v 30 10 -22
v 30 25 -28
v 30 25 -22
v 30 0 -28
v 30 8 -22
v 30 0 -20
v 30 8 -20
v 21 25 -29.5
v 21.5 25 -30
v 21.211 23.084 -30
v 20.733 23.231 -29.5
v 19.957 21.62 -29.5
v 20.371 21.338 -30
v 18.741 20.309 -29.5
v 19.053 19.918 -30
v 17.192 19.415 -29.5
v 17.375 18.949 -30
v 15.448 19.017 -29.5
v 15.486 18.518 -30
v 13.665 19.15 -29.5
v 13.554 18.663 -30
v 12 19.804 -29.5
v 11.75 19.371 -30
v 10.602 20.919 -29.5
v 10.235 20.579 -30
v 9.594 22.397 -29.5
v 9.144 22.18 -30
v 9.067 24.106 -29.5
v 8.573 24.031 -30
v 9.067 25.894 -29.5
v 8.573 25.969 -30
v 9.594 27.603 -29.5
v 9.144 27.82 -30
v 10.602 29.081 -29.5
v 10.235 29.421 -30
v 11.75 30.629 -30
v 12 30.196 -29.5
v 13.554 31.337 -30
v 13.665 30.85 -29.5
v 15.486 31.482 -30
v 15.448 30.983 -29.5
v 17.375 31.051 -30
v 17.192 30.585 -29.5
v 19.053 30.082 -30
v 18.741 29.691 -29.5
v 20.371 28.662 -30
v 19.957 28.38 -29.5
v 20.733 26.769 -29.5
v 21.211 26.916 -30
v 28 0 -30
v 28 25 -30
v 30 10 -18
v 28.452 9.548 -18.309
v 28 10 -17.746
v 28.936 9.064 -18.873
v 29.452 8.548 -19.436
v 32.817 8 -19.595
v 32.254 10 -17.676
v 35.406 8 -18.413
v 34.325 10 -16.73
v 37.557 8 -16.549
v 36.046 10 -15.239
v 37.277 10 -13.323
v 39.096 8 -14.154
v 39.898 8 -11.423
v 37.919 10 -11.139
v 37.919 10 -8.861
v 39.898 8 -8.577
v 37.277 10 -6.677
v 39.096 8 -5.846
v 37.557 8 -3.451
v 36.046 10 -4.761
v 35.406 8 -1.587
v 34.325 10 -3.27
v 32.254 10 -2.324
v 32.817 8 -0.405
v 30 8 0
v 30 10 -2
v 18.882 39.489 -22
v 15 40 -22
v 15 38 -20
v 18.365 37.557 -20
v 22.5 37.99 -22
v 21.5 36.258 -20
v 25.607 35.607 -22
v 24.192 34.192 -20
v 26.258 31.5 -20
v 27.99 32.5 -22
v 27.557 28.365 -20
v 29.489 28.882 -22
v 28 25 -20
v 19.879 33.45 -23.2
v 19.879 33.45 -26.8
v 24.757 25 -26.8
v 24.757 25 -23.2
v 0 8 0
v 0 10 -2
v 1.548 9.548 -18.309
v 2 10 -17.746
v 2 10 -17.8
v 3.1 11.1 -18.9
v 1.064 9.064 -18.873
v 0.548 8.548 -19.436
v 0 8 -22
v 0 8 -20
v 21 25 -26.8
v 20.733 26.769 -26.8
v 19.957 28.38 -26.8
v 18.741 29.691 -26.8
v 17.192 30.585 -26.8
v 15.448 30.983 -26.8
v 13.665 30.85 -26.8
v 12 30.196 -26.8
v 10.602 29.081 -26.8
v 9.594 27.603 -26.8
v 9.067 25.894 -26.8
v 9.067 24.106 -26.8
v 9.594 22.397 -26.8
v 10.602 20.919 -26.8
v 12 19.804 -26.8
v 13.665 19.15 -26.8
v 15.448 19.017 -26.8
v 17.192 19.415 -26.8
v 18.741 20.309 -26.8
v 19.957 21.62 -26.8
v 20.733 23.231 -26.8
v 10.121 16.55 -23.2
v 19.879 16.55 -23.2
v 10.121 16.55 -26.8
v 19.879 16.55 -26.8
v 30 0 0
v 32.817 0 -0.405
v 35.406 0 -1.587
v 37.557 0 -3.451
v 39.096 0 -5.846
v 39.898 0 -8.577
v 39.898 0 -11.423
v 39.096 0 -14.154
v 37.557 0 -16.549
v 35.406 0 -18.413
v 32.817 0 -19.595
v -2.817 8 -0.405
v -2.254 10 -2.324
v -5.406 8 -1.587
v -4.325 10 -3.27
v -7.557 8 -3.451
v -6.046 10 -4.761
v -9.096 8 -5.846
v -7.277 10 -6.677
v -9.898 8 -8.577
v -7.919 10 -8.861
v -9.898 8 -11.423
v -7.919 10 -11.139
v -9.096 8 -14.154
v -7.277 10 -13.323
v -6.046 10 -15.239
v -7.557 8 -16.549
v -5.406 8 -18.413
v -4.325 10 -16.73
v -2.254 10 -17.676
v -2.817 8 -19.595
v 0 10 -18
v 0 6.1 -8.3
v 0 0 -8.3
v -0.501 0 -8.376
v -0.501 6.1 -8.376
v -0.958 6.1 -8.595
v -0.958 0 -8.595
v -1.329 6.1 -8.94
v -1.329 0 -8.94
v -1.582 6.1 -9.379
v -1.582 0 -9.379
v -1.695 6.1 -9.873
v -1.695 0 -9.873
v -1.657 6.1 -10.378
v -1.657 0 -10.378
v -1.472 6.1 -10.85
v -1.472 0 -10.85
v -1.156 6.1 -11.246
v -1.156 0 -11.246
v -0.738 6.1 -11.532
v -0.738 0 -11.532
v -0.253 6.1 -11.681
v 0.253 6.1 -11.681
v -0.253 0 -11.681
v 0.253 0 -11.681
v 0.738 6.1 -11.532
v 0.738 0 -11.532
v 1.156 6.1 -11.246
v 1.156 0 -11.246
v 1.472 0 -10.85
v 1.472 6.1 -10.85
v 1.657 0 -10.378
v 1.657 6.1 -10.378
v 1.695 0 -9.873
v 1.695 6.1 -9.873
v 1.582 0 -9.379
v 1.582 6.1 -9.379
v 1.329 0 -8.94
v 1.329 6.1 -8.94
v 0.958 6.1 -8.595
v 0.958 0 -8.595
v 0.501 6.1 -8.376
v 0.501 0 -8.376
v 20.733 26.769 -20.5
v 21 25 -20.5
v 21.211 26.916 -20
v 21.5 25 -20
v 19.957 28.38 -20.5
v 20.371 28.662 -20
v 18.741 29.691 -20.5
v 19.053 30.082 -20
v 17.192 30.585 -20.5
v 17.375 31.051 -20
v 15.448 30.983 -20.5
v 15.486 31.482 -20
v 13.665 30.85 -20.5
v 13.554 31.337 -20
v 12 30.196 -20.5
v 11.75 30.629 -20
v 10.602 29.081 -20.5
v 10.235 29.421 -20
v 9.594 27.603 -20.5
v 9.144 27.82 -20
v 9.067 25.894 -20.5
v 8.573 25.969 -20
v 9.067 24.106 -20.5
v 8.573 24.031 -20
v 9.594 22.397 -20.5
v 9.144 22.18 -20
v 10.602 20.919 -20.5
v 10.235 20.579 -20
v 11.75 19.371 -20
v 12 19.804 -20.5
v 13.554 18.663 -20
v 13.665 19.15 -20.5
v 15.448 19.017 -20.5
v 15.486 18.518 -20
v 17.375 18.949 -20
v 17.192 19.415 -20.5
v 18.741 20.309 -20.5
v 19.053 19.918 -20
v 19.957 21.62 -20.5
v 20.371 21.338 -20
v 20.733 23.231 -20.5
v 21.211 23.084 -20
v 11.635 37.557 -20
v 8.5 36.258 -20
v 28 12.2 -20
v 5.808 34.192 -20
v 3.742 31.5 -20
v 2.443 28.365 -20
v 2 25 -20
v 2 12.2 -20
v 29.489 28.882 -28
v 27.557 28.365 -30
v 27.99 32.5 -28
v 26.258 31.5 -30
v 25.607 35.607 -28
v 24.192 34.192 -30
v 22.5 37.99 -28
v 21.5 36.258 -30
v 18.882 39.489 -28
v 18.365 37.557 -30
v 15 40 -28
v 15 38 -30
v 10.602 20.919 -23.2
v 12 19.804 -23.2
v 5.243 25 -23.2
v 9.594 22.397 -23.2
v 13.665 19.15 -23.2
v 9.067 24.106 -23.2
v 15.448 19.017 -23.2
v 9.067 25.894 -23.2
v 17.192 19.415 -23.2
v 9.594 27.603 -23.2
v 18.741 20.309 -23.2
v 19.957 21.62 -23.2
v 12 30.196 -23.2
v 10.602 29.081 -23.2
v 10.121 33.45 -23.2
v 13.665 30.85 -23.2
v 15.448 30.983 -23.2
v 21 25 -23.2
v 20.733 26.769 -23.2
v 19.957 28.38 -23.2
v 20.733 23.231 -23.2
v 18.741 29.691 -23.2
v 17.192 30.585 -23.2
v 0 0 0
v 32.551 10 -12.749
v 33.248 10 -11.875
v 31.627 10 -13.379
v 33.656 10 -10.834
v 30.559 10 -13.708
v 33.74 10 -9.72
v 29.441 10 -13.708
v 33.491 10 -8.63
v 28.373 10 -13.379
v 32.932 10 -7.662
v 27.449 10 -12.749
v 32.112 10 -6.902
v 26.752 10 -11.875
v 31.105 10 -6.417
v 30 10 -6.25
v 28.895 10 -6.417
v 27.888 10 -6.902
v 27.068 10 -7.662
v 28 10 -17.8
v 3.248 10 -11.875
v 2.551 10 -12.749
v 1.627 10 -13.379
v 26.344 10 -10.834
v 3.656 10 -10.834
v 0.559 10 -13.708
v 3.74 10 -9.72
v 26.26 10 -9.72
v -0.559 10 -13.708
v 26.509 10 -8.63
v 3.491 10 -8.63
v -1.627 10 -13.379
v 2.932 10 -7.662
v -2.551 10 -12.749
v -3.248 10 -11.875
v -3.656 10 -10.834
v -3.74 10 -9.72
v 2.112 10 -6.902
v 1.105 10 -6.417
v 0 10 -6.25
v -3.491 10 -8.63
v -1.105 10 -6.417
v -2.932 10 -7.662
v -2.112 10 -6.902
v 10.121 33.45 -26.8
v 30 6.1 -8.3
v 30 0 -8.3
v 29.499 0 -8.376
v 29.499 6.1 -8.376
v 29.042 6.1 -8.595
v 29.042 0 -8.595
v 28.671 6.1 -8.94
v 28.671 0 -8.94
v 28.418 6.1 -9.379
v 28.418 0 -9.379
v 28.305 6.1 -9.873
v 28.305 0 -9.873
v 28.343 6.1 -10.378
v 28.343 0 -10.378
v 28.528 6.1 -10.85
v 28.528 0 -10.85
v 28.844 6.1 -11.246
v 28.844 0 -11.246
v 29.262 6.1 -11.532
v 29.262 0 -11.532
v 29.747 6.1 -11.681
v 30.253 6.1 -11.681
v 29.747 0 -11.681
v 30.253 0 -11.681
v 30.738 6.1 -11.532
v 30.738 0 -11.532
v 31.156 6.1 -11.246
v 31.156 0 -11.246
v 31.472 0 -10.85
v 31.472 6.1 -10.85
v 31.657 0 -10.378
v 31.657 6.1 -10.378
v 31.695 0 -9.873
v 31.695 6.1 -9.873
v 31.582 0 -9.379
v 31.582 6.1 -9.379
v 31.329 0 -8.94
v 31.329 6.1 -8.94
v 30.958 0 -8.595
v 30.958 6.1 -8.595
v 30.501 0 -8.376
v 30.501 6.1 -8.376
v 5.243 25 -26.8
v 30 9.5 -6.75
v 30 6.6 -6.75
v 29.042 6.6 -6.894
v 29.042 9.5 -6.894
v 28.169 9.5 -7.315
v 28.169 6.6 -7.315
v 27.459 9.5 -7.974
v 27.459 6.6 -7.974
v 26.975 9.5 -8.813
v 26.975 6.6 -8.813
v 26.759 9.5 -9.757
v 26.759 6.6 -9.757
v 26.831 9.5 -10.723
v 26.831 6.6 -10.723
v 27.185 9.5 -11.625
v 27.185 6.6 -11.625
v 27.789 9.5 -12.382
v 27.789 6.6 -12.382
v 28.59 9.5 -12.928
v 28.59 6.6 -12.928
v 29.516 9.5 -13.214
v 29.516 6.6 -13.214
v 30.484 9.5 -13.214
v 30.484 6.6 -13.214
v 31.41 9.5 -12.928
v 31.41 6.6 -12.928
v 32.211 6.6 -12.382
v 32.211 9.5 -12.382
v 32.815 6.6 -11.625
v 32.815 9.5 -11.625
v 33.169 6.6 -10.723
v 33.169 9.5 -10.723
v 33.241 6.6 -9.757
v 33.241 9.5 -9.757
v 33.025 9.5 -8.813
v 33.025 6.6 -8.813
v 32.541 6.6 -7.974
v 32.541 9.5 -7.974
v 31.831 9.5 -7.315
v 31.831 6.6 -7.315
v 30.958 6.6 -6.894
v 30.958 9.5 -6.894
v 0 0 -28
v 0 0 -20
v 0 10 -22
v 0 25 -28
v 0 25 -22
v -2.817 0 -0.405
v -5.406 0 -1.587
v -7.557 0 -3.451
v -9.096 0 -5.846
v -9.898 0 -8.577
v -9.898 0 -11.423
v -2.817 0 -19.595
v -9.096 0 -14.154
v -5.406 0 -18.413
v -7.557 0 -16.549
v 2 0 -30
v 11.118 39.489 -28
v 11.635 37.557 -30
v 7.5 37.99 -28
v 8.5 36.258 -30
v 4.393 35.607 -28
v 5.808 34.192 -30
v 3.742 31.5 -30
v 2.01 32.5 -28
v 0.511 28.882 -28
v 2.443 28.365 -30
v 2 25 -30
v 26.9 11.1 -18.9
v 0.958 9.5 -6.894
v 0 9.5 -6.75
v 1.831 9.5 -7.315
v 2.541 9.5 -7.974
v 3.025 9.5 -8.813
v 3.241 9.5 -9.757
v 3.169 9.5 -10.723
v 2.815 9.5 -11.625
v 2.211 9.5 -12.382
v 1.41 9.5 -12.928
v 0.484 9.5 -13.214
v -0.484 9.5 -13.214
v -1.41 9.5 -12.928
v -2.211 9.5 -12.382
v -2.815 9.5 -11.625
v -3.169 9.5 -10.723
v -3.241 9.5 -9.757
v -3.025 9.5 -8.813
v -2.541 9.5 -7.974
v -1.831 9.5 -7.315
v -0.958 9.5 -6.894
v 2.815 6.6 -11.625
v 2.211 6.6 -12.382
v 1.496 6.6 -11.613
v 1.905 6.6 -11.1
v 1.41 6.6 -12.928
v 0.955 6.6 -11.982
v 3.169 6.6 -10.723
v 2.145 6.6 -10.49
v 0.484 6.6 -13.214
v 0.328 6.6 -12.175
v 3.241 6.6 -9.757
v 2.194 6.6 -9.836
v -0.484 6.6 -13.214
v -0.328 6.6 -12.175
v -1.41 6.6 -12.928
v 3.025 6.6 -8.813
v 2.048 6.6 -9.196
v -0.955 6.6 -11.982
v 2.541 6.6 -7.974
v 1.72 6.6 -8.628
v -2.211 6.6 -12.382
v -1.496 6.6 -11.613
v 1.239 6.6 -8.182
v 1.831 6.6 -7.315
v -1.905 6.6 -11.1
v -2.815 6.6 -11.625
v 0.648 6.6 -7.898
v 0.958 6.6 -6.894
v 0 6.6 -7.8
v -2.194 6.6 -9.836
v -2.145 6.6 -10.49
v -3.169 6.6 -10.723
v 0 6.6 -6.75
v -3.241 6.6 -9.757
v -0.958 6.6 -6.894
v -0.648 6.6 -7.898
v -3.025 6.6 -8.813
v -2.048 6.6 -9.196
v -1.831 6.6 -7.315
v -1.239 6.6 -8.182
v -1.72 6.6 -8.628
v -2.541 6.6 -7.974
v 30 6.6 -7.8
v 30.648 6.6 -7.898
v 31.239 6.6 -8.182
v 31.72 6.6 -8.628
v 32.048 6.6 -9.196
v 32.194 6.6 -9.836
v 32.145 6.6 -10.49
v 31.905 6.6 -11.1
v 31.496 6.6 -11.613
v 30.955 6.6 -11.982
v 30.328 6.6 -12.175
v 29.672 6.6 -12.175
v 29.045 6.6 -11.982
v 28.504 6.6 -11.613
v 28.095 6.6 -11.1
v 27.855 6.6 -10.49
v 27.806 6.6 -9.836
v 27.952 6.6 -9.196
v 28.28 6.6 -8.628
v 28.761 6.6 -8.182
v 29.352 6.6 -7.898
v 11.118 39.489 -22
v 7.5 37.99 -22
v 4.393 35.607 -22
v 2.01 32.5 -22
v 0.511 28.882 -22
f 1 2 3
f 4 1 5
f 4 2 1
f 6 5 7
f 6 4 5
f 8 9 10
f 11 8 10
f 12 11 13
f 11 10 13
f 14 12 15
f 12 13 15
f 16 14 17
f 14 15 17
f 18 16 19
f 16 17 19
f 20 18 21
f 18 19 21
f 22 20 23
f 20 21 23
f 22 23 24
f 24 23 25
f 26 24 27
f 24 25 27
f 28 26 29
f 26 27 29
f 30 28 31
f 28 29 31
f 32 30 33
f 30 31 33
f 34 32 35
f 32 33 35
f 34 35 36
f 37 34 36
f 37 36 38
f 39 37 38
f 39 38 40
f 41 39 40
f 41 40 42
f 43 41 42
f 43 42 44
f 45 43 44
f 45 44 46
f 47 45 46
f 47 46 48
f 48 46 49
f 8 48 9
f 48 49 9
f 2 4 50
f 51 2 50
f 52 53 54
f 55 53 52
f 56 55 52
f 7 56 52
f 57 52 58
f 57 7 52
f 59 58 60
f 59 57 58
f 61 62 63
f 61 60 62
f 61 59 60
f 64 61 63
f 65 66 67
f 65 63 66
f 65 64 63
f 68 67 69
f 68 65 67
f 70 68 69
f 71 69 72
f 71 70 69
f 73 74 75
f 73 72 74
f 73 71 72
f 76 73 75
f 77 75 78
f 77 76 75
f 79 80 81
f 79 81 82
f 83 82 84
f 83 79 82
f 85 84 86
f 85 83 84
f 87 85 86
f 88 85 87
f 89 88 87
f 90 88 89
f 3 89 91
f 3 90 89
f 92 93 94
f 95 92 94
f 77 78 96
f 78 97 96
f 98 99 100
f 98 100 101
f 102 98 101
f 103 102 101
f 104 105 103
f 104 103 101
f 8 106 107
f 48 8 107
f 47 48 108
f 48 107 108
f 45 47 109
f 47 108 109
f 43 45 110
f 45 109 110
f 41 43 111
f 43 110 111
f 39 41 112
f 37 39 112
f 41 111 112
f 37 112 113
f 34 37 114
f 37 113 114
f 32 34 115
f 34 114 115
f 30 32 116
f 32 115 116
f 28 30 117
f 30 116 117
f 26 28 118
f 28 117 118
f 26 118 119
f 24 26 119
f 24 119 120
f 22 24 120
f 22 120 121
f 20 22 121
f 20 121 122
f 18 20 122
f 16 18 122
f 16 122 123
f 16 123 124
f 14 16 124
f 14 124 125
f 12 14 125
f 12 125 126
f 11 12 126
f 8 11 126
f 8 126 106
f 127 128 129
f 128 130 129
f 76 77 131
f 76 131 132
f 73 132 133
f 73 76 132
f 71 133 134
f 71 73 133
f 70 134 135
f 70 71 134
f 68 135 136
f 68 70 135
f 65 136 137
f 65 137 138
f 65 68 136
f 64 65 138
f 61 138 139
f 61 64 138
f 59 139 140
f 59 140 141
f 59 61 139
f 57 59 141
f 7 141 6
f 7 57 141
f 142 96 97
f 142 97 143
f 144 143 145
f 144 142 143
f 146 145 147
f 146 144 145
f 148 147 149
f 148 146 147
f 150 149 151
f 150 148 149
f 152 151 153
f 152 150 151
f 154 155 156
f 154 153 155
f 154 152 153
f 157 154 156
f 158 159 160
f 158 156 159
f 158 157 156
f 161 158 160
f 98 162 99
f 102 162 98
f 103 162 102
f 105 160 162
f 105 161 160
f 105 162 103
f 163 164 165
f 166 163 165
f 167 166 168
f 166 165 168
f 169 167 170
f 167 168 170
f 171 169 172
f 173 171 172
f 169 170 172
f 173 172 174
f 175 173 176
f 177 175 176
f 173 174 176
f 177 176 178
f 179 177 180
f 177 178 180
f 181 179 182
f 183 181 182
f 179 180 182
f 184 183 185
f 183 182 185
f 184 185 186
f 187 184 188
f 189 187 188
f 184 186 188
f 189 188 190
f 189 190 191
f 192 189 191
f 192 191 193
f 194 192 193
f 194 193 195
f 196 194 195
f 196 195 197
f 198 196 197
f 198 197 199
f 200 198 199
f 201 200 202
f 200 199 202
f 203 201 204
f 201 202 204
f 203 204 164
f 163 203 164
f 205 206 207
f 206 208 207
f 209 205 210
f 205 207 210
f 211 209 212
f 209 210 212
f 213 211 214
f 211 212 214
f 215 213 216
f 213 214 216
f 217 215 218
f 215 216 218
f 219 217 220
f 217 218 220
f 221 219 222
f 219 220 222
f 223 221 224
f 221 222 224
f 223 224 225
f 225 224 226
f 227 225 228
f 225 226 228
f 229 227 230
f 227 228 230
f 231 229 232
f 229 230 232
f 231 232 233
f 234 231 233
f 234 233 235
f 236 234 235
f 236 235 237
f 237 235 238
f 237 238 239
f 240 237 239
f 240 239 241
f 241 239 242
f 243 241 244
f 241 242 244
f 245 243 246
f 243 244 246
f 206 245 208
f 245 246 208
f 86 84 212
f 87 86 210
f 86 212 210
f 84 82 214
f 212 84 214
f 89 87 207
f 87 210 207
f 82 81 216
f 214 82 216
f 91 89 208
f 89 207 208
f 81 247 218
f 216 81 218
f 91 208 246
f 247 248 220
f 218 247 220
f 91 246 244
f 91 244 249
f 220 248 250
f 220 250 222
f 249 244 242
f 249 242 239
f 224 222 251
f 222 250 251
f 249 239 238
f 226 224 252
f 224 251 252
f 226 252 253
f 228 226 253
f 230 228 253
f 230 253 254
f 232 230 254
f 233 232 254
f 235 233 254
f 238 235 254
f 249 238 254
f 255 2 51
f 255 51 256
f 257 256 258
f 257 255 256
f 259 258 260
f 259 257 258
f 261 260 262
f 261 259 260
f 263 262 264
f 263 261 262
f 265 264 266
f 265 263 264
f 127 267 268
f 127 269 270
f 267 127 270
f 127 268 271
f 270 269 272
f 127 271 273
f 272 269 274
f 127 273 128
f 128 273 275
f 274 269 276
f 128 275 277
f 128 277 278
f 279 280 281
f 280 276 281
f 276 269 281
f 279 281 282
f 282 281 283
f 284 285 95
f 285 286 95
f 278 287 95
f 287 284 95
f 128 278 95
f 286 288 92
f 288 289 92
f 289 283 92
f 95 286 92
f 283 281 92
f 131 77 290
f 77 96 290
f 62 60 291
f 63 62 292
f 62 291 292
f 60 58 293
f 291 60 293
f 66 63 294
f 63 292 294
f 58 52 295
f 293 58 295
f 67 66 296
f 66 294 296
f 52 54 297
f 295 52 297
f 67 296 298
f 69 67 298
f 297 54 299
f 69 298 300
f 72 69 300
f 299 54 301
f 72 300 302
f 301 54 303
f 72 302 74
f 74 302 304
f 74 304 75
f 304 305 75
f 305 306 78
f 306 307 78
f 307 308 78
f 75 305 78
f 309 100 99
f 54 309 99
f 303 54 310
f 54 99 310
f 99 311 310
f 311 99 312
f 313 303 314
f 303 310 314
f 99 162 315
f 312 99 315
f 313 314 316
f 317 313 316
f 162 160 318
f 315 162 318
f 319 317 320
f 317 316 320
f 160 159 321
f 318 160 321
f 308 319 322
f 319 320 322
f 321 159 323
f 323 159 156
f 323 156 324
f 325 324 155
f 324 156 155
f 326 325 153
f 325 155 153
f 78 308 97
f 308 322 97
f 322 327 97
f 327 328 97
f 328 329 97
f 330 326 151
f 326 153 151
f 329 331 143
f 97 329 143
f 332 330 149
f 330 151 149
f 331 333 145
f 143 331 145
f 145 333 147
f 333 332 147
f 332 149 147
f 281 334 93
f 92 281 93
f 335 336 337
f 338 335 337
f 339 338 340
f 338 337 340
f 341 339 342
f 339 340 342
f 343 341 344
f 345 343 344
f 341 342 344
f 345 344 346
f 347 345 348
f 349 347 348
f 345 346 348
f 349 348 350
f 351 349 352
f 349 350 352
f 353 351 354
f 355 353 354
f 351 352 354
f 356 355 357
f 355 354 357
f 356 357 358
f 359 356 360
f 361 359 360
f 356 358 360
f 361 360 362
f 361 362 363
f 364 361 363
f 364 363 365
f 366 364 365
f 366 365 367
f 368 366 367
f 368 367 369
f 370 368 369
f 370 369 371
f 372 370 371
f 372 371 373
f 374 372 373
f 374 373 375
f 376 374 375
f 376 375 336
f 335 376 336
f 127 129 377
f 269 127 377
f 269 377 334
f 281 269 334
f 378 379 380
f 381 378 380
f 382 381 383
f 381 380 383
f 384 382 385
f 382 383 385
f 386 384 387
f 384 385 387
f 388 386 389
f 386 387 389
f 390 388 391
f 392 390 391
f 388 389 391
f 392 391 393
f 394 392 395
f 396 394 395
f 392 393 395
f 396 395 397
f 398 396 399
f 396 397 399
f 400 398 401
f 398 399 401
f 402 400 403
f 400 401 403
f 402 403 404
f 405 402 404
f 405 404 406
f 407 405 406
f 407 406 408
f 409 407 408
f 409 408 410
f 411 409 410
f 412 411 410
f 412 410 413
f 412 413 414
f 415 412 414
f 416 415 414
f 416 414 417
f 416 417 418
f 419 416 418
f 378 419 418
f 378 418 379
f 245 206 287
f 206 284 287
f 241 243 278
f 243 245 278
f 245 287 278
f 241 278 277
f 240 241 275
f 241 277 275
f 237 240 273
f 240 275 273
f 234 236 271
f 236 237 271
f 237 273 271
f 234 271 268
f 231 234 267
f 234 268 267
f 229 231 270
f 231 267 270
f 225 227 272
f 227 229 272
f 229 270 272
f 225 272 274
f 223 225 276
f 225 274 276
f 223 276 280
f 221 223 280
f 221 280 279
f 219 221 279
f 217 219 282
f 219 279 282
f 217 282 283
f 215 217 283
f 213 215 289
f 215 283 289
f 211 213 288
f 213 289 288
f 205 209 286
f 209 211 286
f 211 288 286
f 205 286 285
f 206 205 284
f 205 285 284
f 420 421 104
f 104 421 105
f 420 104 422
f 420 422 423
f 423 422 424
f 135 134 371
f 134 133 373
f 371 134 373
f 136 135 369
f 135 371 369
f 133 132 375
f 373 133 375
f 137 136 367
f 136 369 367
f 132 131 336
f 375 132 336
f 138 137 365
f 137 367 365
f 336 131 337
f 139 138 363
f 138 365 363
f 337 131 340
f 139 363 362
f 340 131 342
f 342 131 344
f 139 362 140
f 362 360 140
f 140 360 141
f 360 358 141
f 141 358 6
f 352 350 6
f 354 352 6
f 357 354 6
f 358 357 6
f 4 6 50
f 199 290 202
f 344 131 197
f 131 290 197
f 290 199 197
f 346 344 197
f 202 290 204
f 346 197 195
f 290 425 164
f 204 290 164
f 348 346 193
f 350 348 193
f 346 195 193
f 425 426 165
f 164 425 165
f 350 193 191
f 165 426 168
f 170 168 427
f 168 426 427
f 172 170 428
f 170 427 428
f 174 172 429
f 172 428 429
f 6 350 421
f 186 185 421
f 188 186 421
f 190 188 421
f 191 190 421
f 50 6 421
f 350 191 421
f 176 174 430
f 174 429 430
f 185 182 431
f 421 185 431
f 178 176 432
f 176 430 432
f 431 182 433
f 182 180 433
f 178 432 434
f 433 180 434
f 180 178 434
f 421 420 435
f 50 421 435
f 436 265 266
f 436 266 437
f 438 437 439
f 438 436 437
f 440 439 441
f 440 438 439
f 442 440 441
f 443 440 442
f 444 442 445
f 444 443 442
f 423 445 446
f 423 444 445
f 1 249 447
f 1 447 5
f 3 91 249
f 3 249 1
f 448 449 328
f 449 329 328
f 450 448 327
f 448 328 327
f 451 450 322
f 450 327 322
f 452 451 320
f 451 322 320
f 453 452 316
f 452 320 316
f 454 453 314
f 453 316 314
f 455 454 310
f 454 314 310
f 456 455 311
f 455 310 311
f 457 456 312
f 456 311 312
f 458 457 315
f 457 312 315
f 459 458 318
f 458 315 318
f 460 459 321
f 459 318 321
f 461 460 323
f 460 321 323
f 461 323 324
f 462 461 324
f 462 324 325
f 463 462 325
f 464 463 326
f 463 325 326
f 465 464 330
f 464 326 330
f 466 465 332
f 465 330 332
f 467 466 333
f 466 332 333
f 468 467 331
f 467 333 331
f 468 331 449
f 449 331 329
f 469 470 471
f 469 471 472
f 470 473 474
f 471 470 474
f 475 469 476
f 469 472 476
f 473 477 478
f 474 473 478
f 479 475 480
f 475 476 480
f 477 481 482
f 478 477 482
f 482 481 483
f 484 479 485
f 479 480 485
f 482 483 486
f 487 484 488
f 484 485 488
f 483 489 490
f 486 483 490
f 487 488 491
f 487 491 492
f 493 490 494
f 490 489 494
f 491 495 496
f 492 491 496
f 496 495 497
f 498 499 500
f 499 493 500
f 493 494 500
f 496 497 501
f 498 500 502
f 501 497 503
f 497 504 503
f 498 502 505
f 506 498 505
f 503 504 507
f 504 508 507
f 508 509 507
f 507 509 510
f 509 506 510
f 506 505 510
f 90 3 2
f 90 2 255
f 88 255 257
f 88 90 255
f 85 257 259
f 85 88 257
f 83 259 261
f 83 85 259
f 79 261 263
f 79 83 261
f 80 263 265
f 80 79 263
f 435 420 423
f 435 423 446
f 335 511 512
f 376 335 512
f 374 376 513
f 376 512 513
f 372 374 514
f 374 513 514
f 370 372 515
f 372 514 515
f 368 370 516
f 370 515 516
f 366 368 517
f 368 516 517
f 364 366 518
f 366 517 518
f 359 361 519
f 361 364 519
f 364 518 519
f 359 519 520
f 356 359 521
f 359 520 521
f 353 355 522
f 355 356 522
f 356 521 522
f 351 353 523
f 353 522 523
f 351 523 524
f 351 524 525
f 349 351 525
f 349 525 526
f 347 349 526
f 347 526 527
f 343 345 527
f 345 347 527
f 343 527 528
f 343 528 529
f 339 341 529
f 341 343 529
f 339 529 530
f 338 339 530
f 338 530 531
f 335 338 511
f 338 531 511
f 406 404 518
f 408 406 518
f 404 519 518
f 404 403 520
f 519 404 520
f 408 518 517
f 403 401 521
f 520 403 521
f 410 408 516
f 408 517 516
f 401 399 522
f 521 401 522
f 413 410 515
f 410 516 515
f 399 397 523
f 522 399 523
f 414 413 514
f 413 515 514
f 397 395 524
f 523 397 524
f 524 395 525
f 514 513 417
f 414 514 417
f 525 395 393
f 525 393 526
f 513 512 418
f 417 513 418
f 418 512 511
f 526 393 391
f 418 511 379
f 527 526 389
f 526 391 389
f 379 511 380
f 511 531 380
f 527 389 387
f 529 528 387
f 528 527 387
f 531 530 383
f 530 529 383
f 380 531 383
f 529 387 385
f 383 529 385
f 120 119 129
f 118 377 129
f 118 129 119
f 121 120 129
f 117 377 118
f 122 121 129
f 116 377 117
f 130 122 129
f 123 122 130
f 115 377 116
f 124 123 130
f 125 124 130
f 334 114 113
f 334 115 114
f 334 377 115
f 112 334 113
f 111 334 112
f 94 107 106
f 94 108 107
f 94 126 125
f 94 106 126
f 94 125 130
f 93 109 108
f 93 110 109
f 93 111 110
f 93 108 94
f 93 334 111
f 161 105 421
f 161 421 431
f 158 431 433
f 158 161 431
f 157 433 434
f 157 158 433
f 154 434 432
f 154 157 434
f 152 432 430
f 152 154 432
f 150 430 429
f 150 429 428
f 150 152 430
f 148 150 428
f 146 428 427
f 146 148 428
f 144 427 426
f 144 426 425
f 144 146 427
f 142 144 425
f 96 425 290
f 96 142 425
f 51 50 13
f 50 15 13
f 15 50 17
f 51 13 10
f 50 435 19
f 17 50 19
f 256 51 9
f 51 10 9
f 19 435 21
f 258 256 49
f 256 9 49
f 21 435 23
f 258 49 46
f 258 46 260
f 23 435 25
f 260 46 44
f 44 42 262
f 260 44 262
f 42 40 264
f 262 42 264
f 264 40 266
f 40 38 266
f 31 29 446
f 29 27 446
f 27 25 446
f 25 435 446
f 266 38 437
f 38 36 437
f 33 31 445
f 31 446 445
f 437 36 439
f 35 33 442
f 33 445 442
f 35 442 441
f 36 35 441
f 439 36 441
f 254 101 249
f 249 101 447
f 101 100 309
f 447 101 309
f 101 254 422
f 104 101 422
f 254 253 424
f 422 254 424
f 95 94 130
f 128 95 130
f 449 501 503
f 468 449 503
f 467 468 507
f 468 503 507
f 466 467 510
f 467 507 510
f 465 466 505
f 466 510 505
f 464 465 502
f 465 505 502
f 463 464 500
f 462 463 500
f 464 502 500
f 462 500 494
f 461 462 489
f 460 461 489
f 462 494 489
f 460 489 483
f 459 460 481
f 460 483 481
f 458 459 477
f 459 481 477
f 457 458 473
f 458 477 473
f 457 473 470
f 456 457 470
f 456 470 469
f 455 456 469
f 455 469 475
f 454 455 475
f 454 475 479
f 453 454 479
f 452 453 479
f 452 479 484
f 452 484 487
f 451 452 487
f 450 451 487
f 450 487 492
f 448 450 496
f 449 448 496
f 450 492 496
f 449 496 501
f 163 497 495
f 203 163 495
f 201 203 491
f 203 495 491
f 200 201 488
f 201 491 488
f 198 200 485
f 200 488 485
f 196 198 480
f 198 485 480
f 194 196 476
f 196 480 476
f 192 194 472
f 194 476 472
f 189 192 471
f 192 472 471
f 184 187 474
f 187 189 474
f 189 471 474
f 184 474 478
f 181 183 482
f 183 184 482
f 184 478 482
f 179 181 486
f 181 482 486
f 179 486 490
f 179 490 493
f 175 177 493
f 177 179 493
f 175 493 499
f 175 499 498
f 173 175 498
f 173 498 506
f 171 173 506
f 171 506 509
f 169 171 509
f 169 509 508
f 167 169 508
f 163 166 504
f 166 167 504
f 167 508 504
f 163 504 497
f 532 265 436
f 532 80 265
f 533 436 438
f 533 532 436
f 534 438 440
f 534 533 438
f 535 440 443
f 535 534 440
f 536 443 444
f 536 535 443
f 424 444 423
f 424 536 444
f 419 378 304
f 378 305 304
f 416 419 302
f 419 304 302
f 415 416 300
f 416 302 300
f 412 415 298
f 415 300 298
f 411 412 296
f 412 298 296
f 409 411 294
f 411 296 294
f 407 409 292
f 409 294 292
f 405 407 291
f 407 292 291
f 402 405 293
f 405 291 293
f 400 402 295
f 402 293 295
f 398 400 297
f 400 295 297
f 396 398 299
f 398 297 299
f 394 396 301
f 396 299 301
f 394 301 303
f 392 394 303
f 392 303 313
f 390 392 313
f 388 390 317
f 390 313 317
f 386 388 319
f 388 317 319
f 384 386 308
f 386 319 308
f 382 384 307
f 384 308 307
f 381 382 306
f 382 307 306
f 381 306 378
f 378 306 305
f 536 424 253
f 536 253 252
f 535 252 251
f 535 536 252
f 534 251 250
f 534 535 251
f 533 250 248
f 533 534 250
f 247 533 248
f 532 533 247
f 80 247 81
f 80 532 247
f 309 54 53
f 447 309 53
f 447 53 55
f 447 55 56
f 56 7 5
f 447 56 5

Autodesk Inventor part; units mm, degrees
ref_plane "YZ Plane" through (0, 0, 0) normal (1, 0, 0) x (0, 1, 0)
ref_plane "XZ Plane" through (0, 0, 0) normal (0, 1, 0) x (-1, 0, 0)
sketch "Skizze1" plane through (0, 0, 0) normal (1, 0, 0) x (0, 1, 0)
  line L0 (0, 0) -> (0, -30)
  line L1 (0, -30) -> (40, -30)
  line L2 (40, -30) -> (40, -20)
  line L3 (40, -20) -> (10, -20)
  line L4 (10, -20) -> (10, 0)
  line L5 (10, 0) -> (0, 0)
  dimension "d0" = 40
  dimension "d1" = 30
  dimension "d2" = 10
  dimension "d3" = 10
extrude "Extrusion1" add sketch "Skizze1" along normal blind 30
ref_plane "Arbeitsebene1" through (0, 10, -25) normal (0, 0, 1) x (1, 0, 0)
sketch "Skizze2" plane through (0, 10, -25) normal (0, 0, 1) x (1, 0, 0)
  line L0 (0, -10) -> (0, 30) projected
  line L1 (0, 30) -> (30, 30) projected
  line L2 (30, -10) -> (30, 30) projected
  line L3 (0, 30) -> (30, 0) construction
  line L4 (30, 30) -> (0, 0) construction
  line L5 (0, 0) -> (30, 0) construction
  line L6 (5.2428, 15) -> (10.1214, 23.45)
  line L7 (10.1214, 23.45) -> (19.8786, 23.45)
  line L8 (19.8786, 23.45) -> (24.7572, 15)
  line L9 (24.7572, 15) -> (19.8786, 6.55)
  line L10 (19.8786, 6.55) -> (10.1214, 6.55)
  line L11 (10.1214, 6.55) -> (5.2428, 15)
  circle A0 centre (15, 15) radius 6
  dimension "d6" = 16.9
  dimension "d9" = 12
extrude "Extrusion2" cut sketch "Skizze2" along normal mid plane 3.6
extrude "Extrusion3" cut sketch "Skizze2" along normal mid plane 10 contours A0
sketch "Skizze3" plane through (0, 10, 0) normal (0, 1, 0) x (1, 0, 0)
  line L0 (0, 20) -> (0, 0) projected
  line L1 (0, 0) -> (30, 0) projected
  line L2 (30, 20) -> (30, 0) projected
  line L3 (0, 20) -> (30, 20) projected
  arc A0 (0, 20) -> (0, 0) centre (0, 10) ccw
  arc A1 (30, 0) -> (30, 20) centre (30, 10) ccw
  point P0 (0, 0)
extrude "Extrusion4" add sketch "Skizze3" against normal up to surface (10 mm away) contours L0 A0 | A1 L2
hole "Bohrung1" at (0, 10, -10) at (30, 10, -10) direction (0, -1, 0) diameter 3.4 end through all counterbore diameter 6.5 counterbore depth 3.4 clearance for "Inbusschraube ISO 4762" size "M3" standard "ISO"
fillet "Rundung1" radius 15 2 edges at (30, 40, -25) (0, 40, -25)
chamfer "Fasen1" distance 2 angle 45 9 edges at (15, 10, 0) (40, 10, -10) (-10, 10, -10) (30, 17.5001, -20) (25.6066, 35.6066, -20) (0, 17.5001, -20) (30, 12.5001, -30) (25.6066, 35.6066, -30) (0, 12.5001, -30)
chamfer "Fasen2" distance 2 angle 45 2 edges at (30, 10, -20) (0, 10, -20)
chamfer "Fasen3" distance 0.5 angle 45 6 edges at (0, 10, -13.25) (30, 10, -13.25) (0, 6.6, -11.7) (30, 6.6, -11.7) (9, 25, -20) (9, 25, -30)
chamfer "Fasen4" distance 2.2 angle 45 1 edges at (15, 10, -20)
properties part number "Sensorhalter_Portal" material "PC/ABS-Kunststoff"
